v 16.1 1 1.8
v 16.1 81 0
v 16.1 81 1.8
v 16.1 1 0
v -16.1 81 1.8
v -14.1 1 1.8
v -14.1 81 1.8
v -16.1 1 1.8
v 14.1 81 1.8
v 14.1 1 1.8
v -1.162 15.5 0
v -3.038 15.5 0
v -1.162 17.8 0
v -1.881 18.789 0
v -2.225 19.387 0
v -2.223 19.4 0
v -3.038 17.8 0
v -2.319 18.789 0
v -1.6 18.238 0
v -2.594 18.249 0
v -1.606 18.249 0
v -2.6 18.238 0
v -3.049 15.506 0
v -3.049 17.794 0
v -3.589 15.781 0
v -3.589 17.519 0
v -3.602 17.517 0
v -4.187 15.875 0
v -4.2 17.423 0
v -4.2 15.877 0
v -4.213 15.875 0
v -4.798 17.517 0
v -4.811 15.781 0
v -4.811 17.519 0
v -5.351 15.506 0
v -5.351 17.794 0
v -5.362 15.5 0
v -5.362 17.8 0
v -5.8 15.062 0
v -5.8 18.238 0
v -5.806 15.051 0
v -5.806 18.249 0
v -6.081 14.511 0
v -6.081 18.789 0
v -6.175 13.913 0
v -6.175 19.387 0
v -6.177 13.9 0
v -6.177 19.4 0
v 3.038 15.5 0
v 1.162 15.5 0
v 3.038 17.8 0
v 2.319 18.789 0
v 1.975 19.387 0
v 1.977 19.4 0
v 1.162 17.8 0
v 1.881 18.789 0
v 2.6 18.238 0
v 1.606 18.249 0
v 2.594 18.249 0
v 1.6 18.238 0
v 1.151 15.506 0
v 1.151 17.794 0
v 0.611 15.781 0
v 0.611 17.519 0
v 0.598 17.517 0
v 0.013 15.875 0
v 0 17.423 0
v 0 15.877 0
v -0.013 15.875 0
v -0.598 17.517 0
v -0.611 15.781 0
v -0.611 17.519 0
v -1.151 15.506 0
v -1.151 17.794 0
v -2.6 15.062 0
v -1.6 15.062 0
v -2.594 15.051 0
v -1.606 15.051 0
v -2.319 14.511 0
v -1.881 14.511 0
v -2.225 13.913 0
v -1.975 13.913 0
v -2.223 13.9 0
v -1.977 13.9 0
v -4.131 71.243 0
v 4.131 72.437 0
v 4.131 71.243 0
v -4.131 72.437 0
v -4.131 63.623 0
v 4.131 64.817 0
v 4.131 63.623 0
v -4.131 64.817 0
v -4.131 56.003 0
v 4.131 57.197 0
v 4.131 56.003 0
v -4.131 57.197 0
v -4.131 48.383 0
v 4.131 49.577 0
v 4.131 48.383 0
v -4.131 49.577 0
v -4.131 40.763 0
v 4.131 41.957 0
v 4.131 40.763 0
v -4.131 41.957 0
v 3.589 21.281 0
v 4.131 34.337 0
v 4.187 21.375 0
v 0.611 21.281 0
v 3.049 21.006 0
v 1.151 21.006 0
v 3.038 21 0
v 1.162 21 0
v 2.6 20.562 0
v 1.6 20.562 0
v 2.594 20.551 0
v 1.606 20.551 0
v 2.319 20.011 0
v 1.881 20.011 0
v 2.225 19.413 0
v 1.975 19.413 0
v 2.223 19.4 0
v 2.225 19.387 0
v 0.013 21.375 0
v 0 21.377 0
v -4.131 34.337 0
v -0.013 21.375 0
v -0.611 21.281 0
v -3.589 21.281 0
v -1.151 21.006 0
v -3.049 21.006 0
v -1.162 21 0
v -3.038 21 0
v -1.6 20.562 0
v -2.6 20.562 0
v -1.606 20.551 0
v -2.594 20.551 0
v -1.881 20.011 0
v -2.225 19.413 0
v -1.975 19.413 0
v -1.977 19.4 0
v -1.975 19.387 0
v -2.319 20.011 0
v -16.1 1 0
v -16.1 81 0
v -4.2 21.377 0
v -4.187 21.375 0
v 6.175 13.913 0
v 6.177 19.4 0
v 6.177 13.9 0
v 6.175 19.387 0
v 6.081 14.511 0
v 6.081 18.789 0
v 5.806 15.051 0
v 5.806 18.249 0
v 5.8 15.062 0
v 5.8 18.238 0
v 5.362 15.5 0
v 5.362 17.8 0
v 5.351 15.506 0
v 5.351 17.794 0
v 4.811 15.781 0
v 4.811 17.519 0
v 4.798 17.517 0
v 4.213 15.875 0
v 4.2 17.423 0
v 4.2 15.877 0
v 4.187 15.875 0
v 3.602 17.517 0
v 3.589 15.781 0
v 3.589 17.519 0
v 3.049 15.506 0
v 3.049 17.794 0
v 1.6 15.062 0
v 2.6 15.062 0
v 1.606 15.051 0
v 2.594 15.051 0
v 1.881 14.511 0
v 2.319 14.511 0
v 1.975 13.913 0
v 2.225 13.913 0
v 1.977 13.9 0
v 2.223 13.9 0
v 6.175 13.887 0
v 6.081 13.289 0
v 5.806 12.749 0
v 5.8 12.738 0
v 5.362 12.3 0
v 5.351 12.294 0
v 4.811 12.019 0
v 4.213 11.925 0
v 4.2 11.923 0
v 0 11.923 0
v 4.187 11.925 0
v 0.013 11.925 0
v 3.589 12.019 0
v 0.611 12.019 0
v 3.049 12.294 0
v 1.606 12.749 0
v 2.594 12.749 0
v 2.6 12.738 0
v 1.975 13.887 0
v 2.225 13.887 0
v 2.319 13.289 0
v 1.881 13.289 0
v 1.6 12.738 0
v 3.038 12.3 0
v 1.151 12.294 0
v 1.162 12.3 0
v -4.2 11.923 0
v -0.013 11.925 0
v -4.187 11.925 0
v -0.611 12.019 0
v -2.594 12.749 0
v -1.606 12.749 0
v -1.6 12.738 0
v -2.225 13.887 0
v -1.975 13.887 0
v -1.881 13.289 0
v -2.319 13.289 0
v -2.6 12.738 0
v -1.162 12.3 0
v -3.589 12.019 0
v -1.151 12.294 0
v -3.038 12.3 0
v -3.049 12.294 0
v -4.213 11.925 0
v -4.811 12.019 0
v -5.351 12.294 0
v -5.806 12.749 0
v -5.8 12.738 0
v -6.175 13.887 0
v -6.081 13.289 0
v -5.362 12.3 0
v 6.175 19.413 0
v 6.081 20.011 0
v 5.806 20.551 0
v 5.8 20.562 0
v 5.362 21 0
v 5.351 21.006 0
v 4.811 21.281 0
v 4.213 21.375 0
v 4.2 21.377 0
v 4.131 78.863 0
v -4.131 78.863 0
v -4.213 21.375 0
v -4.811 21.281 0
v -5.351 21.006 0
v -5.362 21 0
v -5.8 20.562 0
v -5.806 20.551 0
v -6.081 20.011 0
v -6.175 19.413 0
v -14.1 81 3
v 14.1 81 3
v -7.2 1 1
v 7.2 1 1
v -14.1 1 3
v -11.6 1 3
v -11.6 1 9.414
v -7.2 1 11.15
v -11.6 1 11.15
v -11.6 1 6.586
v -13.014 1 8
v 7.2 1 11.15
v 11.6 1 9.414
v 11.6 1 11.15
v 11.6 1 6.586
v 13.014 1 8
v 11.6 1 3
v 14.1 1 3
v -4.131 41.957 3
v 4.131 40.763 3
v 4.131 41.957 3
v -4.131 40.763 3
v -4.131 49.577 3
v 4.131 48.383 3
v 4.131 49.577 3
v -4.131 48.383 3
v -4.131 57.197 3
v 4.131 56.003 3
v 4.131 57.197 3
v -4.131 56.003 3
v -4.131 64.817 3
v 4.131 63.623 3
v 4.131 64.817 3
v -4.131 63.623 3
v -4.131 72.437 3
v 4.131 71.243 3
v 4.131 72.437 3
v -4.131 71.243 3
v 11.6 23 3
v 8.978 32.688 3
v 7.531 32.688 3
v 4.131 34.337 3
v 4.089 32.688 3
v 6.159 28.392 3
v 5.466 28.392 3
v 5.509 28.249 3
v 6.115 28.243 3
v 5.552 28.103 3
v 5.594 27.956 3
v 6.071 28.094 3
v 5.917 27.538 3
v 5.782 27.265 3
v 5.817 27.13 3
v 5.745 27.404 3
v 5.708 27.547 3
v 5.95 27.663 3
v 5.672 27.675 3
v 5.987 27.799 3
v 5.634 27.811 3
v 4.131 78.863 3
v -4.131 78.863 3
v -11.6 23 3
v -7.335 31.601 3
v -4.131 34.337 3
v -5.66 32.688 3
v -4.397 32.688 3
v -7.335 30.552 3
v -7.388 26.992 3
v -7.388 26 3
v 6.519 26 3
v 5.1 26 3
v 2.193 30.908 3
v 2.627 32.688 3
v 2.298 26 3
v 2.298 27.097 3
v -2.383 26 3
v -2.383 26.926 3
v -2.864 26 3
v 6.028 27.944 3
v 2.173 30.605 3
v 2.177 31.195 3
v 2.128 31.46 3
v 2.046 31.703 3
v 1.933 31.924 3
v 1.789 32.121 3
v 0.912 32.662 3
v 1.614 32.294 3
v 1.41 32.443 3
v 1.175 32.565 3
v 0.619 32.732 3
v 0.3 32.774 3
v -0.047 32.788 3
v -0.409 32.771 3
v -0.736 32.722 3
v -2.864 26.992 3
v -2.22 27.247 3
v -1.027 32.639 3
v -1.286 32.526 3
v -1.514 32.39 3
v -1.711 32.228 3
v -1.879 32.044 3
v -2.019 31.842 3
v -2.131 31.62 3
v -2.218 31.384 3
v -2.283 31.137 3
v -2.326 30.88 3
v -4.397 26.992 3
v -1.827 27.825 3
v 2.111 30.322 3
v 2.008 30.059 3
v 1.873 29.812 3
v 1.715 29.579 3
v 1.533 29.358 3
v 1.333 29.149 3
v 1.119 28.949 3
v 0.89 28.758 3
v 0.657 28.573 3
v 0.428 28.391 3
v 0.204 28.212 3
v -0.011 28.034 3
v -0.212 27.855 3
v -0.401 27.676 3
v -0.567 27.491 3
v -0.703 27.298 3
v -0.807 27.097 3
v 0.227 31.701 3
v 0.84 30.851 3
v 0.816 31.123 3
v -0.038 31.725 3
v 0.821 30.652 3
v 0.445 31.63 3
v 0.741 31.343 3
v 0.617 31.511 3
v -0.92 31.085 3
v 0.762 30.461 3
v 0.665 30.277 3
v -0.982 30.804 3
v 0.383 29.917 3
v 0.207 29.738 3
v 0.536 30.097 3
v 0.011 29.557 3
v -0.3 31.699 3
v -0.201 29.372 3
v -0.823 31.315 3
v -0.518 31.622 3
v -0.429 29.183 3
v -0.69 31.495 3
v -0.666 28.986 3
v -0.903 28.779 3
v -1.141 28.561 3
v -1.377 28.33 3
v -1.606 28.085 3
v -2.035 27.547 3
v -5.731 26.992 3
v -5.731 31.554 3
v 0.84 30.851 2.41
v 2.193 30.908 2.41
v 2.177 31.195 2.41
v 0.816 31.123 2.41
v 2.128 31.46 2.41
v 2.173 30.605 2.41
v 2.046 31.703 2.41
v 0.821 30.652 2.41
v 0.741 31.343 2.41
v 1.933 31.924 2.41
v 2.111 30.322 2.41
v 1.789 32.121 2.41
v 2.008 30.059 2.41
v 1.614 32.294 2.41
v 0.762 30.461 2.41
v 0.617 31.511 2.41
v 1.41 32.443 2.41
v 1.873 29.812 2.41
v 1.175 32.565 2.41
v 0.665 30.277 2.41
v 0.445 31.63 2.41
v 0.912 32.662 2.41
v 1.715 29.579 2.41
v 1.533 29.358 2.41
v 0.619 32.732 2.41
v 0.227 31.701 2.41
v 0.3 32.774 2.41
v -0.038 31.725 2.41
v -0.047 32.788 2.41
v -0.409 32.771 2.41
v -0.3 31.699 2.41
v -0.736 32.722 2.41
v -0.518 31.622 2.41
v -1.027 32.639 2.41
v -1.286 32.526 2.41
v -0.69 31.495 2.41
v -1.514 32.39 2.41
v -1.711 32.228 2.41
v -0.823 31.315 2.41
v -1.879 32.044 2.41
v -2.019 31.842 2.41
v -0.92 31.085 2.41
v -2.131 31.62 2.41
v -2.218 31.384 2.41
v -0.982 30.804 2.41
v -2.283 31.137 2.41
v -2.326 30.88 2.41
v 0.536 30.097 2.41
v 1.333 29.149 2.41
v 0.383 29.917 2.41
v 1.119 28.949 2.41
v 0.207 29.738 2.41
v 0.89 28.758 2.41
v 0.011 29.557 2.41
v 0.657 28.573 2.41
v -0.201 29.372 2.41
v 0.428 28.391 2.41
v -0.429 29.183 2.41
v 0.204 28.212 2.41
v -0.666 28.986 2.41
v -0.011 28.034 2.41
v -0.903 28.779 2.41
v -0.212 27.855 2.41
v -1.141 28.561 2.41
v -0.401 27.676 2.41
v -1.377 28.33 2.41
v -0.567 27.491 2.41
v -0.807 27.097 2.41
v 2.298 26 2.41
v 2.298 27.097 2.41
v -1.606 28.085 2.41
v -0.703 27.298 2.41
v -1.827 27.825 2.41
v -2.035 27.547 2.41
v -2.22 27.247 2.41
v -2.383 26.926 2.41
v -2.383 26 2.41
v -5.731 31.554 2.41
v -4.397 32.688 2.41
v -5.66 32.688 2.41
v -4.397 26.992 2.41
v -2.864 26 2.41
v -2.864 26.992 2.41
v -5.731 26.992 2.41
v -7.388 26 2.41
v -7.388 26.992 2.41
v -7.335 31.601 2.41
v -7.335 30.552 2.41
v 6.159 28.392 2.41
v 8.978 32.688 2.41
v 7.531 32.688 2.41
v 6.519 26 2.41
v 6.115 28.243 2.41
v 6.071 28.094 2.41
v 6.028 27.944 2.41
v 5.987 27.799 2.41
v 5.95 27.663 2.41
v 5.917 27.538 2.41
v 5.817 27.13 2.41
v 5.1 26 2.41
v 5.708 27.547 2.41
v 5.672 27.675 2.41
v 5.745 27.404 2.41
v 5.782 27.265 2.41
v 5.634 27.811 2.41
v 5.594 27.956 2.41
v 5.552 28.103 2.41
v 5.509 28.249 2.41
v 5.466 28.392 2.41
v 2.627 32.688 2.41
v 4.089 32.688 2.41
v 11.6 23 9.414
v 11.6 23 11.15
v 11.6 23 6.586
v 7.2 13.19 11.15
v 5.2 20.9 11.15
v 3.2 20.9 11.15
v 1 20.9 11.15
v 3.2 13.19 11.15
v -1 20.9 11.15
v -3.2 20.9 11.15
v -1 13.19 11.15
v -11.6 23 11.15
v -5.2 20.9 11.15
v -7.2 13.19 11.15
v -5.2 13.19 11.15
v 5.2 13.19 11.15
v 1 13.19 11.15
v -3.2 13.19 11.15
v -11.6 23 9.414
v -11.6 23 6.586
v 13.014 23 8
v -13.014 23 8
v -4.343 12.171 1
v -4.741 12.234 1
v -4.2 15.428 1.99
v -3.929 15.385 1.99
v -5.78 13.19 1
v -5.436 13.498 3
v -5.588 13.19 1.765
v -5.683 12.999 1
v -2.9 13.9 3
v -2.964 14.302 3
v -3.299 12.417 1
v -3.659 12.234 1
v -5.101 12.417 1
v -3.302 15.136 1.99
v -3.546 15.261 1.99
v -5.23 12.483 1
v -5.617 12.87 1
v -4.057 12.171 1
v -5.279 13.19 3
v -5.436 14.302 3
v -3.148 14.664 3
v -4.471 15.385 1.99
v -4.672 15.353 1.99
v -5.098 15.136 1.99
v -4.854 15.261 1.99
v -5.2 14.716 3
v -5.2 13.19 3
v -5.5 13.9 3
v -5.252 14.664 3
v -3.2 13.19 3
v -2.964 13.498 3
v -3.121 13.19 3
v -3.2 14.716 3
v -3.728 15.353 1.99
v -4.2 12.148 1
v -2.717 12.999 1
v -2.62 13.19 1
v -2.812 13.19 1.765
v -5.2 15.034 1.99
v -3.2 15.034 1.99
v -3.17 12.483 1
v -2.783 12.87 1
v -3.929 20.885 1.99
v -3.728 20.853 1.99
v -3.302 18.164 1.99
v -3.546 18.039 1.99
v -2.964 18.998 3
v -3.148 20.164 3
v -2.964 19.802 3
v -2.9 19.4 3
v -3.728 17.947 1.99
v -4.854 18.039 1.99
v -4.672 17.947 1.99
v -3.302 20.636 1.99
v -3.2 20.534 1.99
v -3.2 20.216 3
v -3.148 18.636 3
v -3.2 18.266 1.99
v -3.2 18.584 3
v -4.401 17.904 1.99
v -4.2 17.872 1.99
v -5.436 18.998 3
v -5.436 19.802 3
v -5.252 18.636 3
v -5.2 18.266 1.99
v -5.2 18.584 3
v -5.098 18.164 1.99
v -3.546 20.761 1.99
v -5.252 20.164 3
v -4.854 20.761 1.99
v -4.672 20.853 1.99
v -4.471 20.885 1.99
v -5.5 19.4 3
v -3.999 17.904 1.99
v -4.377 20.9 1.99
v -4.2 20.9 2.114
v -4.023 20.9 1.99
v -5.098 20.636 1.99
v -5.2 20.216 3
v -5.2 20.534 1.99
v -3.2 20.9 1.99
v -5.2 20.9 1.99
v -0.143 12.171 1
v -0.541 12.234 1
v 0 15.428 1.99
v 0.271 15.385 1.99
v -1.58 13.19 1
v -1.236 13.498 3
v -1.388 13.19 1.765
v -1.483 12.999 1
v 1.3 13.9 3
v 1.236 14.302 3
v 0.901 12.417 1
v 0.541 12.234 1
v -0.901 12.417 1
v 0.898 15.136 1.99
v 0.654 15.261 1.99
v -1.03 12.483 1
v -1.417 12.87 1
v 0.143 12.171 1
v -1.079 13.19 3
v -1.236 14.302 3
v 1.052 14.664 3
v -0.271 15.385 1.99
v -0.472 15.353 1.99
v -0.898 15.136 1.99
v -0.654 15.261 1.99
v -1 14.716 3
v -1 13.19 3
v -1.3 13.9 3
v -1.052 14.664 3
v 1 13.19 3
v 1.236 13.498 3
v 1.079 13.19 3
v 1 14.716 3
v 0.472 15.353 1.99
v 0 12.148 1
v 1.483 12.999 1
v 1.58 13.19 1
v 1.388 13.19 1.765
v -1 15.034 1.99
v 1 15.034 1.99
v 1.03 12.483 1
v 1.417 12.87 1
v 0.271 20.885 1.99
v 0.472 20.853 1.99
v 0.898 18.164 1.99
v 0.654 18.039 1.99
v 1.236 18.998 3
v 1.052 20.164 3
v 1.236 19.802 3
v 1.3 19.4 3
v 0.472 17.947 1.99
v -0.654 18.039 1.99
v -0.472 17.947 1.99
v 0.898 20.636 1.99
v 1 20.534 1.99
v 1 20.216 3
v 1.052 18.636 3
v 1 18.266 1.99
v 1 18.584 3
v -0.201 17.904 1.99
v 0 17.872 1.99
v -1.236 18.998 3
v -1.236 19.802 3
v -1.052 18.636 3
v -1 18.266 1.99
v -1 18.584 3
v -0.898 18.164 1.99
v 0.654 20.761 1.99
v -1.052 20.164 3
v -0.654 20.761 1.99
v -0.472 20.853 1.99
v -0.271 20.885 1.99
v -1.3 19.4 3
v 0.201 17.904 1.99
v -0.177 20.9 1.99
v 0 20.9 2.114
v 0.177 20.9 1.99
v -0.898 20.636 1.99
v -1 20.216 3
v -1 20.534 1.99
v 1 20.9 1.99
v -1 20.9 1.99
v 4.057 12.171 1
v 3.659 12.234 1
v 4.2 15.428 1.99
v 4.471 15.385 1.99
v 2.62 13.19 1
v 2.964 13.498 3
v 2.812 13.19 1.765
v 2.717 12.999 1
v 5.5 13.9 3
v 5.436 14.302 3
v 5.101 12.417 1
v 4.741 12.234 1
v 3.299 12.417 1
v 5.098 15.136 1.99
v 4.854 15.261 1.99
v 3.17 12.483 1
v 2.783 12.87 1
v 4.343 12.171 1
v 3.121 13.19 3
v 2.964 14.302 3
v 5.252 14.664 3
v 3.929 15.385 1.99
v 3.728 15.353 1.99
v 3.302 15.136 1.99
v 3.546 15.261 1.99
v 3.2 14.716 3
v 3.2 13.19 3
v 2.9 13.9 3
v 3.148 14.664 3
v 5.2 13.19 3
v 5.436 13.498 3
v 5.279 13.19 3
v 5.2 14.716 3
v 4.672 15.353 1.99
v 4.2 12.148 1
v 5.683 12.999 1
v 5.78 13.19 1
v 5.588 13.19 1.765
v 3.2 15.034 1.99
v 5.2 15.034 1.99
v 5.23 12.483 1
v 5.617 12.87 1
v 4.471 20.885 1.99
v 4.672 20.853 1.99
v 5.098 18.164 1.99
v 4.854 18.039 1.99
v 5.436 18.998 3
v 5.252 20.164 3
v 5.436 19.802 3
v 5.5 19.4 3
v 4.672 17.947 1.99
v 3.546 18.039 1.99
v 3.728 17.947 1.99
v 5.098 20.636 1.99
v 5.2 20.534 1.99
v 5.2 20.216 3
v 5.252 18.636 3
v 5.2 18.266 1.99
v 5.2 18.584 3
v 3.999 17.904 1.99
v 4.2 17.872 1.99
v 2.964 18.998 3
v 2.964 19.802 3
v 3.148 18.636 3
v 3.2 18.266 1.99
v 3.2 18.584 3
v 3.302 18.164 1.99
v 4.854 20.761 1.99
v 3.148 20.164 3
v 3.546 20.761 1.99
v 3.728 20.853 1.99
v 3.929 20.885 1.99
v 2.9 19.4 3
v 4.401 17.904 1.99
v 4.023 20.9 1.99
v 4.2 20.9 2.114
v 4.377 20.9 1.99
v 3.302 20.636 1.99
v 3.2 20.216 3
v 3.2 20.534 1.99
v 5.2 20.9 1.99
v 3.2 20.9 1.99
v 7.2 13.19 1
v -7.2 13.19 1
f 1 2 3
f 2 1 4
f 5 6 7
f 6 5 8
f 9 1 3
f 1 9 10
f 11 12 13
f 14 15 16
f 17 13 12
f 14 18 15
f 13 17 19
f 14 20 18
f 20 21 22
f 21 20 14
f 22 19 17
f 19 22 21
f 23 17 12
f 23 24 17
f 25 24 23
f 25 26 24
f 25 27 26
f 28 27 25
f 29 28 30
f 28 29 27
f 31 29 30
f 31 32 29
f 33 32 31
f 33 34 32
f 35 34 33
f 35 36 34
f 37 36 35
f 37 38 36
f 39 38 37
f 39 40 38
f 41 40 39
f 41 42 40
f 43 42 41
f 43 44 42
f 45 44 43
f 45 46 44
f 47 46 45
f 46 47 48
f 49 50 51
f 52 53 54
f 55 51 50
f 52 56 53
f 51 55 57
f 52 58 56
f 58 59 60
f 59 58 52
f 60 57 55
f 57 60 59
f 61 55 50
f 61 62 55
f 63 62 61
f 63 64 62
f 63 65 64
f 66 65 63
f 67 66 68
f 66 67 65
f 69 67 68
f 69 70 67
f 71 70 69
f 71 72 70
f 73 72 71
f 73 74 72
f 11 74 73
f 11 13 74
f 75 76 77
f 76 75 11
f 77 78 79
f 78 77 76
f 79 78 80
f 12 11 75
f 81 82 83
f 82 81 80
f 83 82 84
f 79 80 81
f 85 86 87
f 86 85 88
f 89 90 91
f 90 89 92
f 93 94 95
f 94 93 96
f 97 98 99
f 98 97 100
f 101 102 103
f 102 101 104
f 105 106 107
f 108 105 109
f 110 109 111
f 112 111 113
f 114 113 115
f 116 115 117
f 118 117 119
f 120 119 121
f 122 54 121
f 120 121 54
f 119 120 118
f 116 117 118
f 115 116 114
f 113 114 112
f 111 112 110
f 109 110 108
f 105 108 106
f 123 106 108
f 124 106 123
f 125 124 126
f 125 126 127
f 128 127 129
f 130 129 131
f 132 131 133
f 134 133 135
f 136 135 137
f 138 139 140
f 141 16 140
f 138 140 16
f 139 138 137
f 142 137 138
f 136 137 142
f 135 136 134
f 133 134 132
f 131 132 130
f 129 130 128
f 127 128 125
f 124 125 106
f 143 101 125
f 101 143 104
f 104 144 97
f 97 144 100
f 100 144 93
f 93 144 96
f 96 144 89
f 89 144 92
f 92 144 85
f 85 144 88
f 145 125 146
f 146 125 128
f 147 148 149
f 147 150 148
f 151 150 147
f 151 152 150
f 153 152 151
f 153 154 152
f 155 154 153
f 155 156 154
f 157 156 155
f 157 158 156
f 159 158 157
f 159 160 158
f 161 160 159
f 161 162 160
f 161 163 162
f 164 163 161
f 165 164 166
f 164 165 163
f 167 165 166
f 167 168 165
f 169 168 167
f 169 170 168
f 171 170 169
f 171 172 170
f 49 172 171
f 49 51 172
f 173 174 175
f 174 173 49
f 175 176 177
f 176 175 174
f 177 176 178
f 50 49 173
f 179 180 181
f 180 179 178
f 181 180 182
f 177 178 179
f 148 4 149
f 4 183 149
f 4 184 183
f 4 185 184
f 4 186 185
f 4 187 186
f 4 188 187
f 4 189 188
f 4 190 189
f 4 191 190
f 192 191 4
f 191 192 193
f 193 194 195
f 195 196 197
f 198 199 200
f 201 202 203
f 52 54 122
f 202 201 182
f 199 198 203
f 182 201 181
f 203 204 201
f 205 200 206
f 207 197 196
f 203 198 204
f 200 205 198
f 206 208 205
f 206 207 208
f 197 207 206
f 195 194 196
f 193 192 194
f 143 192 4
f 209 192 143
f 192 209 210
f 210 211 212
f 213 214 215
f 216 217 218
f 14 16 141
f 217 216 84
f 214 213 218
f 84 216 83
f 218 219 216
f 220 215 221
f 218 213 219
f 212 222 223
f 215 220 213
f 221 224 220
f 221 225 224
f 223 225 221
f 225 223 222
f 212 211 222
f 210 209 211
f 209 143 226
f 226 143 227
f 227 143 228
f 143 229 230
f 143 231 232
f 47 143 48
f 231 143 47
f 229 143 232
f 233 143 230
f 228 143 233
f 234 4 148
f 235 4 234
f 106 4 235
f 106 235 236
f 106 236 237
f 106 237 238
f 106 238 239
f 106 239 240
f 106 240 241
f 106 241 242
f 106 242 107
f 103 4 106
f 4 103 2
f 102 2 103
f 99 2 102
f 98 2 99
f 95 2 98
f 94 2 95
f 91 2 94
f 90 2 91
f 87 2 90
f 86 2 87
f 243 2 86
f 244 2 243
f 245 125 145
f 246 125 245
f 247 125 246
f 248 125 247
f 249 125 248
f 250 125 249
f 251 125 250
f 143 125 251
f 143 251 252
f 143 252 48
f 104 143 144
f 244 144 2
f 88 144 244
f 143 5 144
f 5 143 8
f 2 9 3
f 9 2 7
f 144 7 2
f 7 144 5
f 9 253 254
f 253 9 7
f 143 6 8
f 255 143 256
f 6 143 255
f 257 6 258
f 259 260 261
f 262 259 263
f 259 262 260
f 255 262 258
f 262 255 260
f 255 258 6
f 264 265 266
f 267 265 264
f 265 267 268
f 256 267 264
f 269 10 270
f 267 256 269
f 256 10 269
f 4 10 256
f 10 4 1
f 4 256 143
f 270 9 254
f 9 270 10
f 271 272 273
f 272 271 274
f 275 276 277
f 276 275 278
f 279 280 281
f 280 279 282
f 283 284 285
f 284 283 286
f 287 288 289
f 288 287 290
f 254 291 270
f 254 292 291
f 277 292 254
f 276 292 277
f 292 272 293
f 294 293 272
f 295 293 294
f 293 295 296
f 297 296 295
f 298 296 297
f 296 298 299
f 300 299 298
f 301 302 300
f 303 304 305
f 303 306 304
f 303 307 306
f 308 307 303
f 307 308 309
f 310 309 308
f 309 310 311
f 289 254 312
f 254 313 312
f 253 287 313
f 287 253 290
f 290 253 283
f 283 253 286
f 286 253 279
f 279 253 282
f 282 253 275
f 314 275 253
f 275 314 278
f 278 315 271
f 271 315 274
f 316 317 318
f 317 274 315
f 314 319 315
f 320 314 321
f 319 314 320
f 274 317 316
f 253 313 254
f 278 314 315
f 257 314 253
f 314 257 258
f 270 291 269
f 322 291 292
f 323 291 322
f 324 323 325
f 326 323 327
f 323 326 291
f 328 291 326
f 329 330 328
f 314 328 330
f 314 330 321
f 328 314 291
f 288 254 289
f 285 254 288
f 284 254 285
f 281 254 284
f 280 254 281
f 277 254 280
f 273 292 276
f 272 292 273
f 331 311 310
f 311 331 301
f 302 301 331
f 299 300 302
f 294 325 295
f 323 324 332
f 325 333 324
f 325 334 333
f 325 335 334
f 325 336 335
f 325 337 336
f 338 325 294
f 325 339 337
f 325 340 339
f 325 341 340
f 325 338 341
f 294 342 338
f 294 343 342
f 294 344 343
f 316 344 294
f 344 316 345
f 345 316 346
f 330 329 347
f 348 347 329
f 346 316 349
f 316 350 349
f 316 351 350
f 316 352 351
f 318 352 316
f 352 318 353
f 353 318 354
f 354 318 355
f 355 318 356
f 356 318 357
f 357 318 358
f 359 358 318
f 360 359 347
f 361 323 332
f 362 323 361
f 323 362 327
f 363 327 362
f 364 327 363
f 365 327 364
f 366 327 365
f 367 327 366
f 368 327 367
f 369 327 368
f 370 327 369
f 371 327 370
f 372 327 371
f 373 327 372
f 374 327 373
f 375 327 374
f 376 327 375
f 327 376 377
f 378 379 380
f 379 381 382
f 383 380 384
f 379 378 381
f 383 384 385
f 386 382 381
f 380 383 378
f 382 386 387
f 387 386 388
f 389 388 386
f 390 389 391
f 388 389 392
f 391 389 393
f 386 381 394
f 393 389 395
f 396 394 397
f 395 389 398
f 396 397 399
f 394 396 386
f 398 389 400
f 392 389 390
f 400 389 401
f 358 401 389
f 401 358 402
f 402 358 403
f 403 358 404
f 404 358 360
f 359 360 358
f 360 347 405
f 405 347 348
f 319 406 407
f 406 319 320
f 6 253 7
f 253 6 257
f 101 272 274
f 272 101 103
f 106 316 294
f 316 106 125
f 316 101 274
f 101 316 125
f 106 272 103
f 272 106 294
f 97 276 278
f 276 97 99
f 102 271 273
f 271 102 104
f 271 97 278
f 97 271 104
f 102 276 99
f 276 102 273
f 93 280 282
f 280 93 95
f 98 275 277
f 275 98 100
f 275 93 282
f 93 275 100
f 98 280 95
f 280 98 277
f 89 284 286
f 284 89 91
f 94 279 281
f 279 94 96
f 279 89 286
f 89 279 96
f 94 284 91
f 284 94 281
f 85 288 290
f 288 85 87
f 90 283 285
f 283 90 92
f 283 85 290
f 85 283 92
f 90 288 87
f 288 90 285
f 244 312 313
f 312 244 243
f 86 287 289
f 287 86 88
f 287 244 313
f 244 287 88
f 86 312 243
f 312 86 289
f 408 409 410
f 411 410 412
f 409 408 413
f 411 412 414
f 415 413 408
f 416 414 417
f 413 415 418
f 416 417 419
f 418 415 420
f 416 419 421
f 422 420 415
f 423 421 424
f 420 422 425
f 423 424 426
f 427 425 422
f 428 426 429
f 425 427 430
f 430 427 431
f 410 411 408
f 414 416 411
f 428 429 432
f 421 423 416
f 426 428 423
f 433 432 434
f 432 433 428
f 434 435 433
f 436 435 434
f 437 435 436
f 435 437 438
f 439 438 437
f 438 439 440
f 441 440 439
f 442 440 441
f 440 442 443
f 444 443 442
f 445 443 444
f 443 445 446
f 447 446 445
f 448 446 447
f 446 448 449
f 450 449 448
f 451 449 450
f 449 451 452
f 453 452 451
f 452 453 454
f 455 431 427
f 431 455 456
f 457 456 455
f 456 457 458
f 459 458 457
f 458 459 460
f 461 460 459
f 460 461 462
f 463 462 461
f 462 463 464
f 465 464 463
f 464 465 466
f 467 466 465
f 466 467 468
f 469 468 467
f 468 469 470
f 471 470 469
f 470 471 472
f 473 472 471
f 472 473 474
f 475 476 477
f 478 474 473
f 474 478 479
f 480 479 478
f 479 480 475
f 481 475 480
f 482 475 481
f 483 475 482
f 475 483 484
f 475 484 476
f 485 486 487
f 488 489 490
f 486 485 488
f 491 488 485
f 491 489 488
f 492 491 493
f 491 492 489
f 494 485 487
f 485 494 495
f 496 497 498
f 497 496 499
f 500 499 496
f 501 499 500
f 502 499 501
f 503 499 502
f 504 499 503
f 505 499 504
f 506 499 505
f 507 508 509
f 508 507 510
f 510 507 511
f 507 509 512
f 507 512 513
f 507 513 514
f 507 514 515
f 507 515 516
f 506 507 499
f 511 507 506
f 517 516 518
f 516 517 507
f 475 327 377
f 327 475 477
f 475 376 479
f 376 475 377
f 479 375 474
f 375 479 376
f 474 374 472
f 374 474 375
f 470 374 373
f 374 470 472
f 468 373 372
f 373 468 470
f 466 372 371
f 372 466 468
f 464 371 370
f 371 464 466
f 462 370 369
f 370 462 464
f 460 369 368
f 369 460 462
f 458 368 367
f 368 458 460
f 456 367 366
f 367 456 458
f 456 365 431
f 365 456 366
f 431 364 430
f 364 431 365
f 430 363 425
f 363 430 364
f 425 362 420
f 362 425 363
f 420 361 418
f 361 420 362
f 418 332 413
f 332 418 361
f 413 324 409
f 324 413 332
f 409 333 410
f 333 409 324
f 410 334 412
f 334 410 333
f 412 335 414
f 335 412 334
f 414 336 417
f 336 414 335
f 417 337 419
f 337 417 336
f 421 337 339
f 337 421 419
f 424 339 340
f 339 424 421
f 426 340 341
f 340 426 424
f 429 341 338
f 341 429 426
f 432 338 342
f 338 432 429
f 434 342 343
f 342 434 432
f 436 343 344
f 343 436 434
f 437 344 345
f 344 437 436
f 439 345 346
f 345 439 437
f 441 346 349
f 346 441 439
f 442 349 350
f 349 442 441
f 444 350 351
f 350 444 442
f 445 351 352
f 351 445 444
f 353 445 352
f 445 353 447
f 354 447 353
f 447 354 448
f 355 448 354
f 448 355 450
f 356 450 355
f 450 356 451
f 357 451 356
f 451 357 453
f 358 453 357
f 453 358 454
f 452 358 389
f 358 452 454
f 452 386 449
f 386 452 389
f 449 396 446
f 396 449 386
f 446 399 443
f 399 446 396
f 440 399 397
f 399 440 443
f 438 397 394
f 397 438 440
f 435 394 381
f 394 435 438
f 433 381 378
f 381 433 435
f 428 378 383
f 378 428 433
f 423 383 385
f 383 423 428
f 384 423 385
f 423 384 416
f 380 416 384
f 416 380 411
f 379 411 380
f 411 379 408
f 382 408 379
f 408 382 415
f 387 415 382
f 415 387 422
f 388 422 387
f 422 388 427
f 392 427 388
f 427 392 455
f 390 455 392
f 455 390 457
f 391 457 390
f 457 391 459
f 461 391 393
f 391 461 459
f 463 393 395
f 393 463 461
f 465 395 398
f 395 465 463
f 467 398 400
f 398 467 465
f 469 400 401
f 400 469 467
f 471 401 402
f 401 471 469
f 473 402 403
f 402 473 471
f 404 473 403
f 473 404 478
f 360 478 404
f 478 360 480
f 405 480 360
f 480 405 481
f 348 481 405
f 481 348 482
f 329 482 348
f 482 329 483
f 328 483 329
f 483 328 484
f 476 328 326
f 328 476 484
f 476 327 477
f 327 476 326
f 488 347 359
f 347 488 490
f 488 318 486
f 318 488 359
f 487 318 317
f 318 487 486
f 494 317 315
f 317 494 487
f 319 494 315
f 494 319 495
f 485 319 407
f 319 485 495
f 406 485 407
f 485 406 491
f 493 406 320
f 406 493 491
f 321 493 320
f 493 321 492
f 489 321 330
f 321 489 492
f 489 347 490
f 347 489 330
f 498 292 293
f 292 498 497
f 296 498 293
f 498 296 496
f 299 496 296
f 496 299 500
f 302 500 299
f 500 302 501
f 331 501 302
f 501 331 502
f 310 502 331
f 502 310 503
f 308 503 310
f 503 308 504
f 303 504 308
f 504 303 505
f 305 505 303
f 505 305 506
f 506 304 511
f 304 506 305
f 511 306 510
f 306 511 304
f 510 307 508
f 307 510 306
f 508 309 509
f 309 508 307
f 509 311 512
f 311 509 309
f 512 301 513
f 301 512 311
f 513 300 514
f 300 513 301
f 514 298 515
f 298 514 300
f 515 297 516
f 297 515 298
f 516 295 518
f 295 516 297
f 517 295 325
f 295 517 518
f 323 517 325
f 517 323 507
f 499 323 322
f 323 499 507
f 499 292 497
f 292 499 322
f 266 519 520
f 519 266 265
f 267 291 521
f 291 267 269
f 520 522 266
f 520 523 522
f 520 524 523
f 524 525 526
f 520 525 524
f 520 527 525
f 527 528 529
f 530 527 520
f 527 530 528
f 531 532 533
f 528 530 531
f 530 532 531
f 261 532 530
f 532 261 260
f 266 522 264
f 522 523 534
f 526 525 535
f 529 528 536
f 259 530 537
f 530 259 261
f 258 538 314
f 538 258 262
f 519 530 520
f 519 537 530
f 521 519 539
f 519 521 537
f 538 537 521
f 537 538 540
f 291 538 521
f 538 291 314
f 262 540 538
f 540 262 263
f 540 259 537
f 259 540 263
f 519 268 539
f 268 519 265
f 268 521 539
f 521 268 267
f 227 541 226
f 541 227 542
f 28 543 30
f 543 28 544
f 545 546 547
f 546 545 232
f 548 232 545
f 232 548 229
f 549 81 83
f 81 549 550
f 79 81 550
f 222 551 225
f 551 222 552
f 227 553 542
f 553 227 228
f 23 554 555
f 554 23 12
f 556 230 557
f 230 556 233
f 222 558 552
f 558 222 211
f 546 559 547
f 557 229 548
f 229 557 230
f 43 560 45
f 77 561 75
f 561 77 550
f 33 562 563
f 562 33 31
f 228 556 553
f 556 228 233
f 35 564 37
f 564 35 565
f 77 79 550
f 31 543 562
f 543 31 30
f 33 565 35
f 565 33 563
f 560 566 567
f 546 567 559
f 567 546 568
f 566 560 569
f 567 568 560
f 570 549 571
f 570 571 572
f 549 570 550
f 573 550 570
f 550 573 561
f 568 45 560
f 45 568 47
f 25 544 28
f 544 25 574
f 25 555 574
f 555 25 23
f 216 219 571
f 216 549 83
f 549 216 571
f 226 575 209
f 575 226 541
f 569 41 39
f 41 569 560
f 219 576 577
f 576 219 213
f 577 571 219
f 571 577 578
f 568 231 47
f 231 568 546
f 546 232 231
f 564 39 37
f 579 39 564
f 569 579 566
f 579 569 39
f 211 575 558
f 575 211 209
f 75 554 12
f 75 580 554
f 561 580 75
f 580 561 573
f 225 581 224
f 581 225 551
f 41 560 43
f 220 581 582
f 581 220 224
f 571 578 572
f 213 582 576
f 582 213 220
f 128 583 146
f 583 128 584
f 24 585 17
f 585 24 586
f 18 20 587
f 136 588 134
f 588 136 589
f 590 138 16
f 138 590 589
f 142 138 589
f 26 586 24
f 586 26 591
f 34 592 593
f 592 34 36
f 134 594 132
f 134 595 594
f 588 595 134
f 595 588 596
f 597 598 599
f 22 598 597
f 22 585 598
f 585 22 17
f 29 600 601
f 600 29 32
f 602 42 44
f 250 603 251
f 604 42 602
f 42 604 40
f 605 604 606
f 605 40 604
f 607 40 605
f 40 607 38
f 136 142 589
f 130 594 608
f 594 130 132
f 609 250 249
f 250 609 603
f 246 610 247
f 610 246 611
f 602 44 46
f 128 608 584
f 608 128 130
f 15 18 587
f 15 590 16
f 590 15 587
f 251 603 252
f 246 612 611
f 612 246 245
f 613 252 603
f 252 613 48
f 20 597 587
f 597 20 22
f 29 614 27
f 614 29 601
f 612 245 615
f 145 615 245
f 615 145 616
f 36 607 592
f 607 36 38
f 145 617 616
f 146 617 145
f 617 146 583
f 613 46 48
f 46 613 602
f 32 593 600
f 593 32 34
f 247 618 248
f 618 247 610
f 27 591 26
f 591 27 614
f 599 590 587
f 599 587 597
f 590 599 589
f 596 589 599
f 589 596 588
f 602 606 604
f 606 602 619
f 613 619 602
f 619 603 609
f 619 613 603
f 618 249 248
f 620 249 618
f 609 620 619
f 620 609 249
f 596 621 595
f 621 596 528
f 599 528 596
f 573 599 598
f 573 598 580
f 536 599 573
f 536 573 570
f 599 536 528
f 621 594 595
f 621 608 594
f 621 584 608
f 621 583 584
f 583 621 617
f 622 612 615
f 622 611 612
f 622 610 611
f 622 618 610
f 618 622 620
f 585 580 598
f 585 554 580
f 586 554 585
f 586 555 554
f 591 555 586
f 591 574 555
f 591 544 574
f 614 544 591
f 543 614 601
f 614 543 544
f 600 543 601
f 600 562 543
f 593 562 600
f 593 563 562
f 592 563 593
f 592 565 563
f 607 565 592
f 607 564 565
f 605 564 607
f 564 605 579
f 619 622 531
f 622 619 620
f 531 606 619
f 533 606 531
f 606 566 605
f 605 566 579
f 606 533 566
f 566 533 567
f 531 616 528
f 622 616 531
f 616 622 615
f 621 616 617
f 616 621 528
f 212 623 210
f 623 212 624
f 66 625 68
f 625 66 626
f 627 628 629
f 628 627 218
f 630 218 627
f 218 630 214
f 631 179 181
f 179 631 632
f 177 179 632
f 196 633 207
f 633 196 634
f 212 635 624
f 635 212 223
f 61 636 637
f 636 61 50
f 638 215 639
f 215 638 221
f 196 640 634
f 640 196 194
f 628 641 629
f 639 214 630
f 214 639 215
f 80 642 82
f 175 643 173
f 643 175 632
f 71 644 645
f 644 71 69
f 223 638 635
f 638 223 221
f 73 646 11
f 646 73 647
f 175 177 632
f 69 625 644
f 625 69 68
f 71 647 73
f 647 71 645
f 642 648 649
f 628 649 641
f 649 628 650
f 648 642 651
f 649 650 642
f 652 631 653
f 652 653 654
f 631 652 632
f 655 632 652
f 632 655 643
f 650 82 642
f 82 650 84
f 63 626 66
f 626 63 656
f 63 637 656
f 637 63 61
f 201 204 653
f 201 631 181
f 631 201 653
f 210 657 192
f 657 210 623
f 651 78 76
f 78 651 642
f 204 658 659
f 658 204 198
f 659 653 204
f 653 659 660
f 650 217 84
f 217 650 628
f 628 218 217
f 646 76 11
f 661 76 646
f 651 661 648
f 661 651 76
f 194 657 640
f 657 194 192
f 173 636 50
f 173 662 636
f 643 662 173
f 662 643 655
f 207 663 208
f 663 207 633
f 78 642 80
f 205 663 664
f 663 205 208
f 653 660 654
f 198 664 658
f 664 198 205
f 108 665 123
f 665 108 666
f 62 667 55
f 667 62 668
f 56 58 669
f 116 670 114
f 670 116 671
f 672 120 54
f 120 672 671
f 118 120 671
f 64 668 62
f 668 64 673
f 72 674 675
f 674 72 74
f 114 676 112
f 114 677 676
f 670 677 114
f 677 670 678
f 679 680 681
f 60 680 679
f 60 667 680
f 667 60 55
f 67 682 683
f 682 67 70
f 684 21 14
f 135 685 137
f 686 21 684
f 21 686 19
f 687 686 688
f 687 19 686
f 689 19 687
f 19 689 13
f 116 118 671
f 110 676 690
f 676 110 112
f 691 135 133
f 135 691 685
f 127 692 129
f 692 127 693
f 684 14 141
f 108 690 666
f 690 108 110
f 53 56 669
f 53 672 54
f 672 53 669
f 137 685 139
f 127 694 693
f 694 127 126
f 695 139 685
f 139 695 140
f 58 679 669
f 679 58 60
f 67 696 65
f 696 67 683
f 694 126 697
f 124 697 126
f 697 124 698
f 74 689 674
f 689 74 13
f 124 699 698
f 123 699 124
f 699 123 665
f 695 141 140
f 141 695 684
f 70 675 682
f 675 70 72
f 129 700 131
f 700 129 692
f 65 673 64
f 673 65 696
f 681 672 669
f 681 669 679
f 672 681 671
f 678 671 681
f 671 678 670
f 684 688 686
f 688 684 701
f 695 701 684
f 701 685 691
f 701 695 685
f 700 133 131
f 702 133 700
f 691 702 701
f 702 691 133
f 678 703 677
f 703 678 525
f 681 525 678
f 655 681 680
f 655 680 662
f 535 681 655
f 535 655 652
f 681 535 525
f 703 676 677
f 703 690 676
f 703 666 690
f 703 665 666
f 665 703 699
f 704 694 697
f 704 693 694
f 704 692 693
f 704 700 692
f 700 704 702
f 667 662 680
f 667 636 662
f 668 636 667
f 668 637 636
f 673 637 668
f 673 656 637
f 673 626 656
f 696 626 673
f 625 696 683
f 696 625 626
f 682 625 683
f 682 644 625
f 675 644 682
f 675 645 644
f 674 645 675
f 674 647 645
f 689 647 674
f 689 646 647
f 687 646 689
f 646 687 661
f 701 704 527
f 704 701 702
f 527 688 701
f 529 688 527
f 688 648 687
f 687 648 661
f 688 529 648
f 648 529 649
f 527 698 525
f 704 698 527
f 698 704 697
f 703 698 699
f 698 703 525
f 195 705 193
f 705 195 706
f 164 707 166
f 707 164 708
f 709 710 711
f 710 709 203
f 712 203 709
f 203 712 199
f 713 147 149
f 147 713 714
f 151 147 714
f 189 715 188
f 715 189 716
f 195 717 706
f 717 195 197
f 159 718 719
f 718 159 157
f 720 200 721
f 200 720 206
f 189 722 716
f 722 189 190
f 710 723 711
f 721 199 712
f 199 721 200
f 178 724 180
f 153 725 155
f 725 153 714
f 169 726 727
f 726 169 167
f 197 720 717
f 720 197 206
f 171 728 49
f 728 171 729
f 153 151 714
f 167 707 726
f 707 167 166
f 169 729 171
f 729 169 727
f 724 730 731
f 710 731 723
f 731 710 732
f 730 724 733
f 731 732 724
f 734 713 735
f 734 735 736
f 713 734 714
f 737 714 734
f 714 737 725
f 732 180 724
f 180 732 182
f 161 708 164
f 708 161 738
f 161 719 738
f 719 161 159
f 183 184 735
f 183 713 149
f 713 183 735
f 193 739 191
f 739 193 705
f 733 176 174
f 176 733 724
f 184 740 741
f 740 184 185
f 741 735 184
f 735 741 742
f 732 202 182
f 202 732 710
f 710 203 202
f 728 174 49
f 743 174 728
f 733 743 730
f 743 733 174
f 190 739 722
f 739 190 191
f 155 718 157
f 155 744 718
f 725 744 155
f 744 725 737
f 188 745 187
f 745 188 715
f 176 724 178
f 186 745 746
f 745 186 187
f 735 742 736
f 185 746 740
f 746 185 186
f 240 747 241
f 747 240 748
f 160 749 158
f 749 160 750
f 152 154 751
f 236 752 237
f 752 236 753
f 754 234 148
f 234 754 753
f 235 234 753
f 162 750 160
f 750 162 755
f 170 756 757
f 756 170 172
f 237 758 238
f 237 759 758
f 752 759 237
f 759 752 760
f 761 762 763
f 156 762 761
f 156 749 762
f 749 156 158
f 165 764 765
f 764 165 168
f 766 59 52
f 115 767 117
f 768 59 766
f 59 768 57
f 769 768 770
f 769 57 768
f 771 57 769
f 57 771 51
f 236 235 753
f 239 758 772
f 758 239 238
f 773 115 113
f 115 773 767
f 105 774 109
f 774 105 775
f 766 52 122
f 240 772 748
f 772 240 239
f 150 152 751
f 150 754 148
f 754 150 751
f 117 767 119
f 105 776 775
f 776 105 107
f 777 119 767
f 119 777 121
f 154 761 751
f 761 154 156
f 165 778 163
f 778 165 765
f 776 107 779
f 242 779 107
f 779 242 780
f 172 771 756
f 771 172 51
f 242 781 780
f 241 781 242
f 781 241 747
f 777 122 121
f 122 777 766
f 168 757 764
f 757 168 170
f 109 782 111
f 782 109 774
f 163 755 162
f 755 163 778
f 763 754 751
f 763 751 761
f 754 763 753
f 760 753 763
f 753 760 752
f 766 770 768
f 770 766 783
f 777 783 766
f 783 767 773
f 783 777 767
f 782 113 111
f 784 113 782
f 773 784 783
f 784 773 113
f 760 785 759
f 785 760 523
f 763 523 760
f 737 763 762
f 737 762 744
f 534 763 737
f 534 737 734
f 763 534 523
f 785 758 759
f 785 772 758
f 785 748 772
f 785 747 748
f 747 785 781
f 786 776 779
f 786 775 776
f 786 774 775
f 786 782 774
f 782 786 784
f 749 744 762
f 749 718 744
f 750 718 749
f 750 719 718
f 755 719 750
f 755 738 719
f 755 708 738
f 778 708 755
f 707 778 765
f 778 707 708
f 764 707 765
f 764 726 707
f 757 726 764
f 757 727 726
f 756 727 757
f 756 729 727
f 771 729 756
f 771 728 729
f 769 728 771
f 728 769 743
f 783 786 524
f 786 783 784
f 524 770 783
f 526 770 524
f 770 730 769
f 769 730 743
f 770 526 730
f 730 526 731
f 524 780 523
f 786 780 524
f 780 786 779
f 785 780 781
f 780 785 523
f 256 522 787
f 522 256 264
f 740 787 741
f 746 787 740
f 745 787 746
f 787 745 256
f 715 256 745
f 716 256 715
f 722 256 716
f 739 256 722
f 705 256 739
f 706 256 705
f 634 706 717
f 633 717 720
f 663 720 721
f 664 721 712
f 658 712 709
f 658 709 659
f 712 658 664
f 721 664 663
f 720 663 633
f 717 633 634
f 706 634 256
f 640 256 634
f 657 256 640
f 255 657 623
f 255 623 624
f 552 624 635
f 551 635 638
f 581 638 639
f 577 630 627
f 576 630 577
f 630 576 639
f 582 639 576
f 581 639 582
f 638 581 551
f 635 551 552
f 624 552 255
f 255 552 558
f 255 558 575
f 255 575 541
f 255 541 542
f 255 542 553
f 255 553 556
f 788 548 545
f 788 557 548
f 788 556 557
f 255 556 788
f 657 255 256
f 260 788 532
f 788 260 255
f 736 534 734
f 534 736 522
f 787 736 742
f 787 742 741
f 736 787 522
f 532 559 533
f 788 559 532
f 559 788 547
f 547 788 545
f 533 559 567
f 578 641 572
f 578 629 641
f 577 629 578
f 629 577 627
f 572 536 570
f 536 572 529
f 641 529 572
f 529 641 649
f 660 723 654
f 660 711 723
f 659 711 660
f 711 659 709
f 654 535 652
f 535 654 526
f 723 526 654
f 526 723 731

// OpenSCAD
// file: ../PCParts/common.scad
atx_psu_width = 150;
atx_psu_height = 86;

card_spacing = 20.32;

fan_connector_width = 6.1;
fan_connector_length = 7.9;

fan_92mm = 92;
fan_92mm_bolt_offset = 82.5/2;

module mock_mobo() {
    $fn=50;
    difference() {
        cube([304.8, 243.84, 2]);
        translate([6.35+281.94,10.16,0]) cylinder(d=4, h=3);
        translate([6.35+281.94,10.16+154.94,0]) cylinder(d=4, h=3);
        translate([6.35+281.94,10.16+227.33,0]) cylinder(d=4, h=3);

        translate([6.35+157.48+45.72,10,0]) cylinder(d=4, h=3);

        translate([6.35+157.48,10.16,0]) cylinder(d=4, h=3);
        translate([6.35+157.48,10.16+154.94,0]) cylinder(d=4, h=3);
        translate([6.35+157.48,10.16+227.33,0]) cylinder(d=4, h=3);

        translate([6.35,22.86,0]) cylinder(d=4, h=3);
        translate([6.35,10.16+154.94,0]) cylinder(d=4, h=3);
        translate([6.35,10.16+227.33,0]) cylinder(d=4, h=3);
    }
}

module mock_card() {
    $fn=50;
    cube([200, 2, 106.7]);
    translate([-12.3, -15.8+22-19.4, -18.8+119.2]) difference() {
        cube([12.3,19.4,1]);
        translate([6.3, 19.4-1-4.8/2,0]) hull() {
            cylinder(d=4.8,h=2, $fn=40);
            translate([0,5,0]) cylinder(d=4.8,h=2, $fn=40);
        }
    }
    difference() {
        translate([-1,-15.8, -18.8]) cube([1,22, 120.2]);
        translate([-1.3,-15.8, -18.8]) cube([2,(18.8-10.6)/2, 11.2]);
        translate([-1.3,-15.8+10.6+(18.8-10.6)/2, -18.8]) cube([2,(18.8-10.6)/2, 11.2]);
        translate([-1.3,-15.8+18.8, -18.8]) cube([2,5, 116.2]);
        translate([-1.3,-15.8, -18.8+116.2]) cube([2,22-18.8, 5]);
    }
    
}

module mock_mobo_card() {
    
    mock_mobo();
    translate([304.8-142,-1.2,18.8-10.4]) rotate([0,0,90]) mock_card();
    translate([304.8-142+card_spacing,-1.2,18.8-10.4]) rotate([0,0,90]) mock_card();
    translate([304.8-142+2*card_spacing,-1.2,18.8-10.4]) rotate([0,0,90]) mock_card();
    translate([304.8-142+3*card_spacing,-1.2,18.8-10.4]) rotate([0,0,90]) mock_card();
    translate([304.8-142+4*card_spacing,-1.2,18.8-10.4]) rotate([0,0,90]) mock_card();
    translate([304.8-142+5*card_spacing,-1.2,18.8-10.4]) rotate([0,0,90]) mock_card();
    translate([304.8-142+6*card_spacing,-1.2,18.8-10.4]) rotate([0,0,90]) mock_card();
}

module mock_ssd() {
    difference() {
        cube([70, 100, 7.1]);
        translate([9.4,0,6.5]) cube([41.4,7,1]);
        translate([10.4,0,0]) cube([39.4,7,2]);
    }
    translate([0,13.6,3]) rotate([0,-90,0]) cylinder(d=2.5, h=5, $fn=30);
    translate([0,100-9.2,3]) rotate([0,-90,0]) cylinder(d=2.5, h=5, $fn=30);

    translate([70+5,13.6,3]) rotate([0,-90,0]) cylinder(d=2.5, h=5, $fn=30);
    translate([70+5,100-9.2,3]) rotate([0,-90,0]) cylinder(d=2.5, h=5, $fn=30);

}


hd_width = 102;
hd_height = 26.1;

screw_dia = 3.6;

module mock_hd() {
    color("white") difference() {
        cube([hd_width,146,26]);
        translate([0,28.3,6.40]) rotate([0,90,0]) cylinder(d=screw_dia, h=5, $fn=30);
        translate([0,69.8,6.40]) rotate([0,90,0]) cylinder(d=screw_dia, h=5, $fn=30);
        translate([0,129.8,6.40]) rotate([0,90,0]) cylinder(d=screw_dia, h=5, $fn=30);

        translate([hd_width-5,28.3,6.40]) rotate([0,90,0]) cylinder(d=screw_dia, h=5, $fn=30);
        translate([hd_width-5,69.8,6.40]) rotate([0,90,0]) cylinder(d=screw_dia, h=5, $fn=30);
        translate([hd_width-5,129.8,6.40]) rotate([0,90,0]) cylinder(d=screw_dia, h=5, $fn=30);

    }
        
}

module minus_atx_psu_holes(hole=3.2) {
    difference() {
        children();
        translate([-138/2,0,6]) rotate([-90,0,0]) cylinder(d=hole, h=5, $fn=30);
        translate([138/2,0,6]) rotate([-90,0,0]) cylinder(d=hole, h=5, $fn=30);
        translate([138/2,0,6+64]) rotate([-90,0,0]) cylinder(d=hole, h=5, $fn=30);
        translate([-150/2+30,0,atx_psu_height-6]) rotate([-90,0,0]) cylinder(d=hole, h=5, $fn=30);
    }
}

module mock_atx_psu(holes=true, slop=0) {
    w = atx_psu_width+2*slop;
    h = atx_psu_height+2*slop;
    if (holes) {
        minus_atx_psu_holes() {
            translate([-w/2,0,0]) cube([w, 140, h]);
        }
    } else {
        translate([-w/2,0,0]) cube([w, 140, h]);
    }
}


module mock_fan_connector_male(slop=0.2) {
    
    module pin() {
        color("grey") cube([0.75,0.75,14.3],center=true);
    }
    
    w = fan_connector_width + slop;
    l = fan_connector_length + slop;
    
    pin_offset = (5.8-0.75)/2;
    union() {
        color("white") {
            translate([0,0,3.2/2]) cube([w, l,3.2], center=true);
            translate([-w/2+0.9/2,0,3.2+8.5/2]) cube([0.9,5,8.5],center=true);
            translate([-w/2+0.9+0.3/2,0,1.7/2+5.7]) cube([0.3,5,1.7],center=true);
        }
        
        translate([-w/2+2.4,0,14.3/2-3.6]) pin();
        translate([-w/2+2.4,pin_offset,14.3/2-3.6]) pin();
        translate([-w/2+2.4,-pin_offset,14.3/2-3.6]) pin();
    }
}


//mock_mobo();
//mock_card();
//mock_mobo_card();
//mock_ssd();
//mock_atx_psu();
//mock_fan_connector_male();
// main file
include <../PCParts/common.scad>;


////// VARIABLES //////
atx_connector_w = 52.2;
atx_connector_l = 10.1;
atx_connector_h = 13;
atx_connector_pins = 24;
atx_connector_pins_w = 47.6;

pcie_connector_w = 14.2;
pcie_connector_l = 10;
pcie_connector_h = 13;
pcie_connector_pins = 6;
pcie_connector_pins_w = 9.5;

pin_d = 1.1;

mount_w = atx_connector_w + pcie_connector_w + 5 + 4;
mount_l = atx_connector_h + 9;

mount_s_w = pcie_connector_w + 5 + 4;
mount_s_l = mount_l;

echo("Mount W", mount_w);
echo("Mount S W", mount_s_w);

echo(mount_w);

y_offset = 2.2;


////// VIEW //////
//debug();
//debug_small();

//mock_atx_connector();
//mock_pcie_connector();
//mock_connector_pcb();

//mount();
//mount_top();

mount_small();
//mount_top_small();


////// MODULES //////
function pin_spacing(w, pin_d, pins) = (w - pin_d)/(pins/2 - 1);
function x_offset(w, pins_w) = -pins_w/2;


module _mock_connector(w, l, h, pins, pins_w) {
    module bent_pin(pin_l) {
        translate([0, 0, 6.7/2])
        cube([pin_d, pin_d, 6.7], center=true);

        translate([0, (pin_l - pin_d)/2, 6.7 - pin_d/2 ])
        cube([pin_d, pin_l, pin_d], center=true);
    }

    translate([0, 0, h/2])
    cube([w, l, h], center=true);
    
    spacing = pin_spacing(pins_w, pin_d, pins);
    echo(spacing);
    x_offset = x_offset(w, pins_w);

    for (i = [0:(pins/2) - 1]) {
        translate([
            x_offset + i*spacing + pin_d/2,
            -l/2 + y_offset + pin_d/2, h
        ])
        bent_pin(11.3);
    }
    
    y_offset_2 = l/2 - y_offset - pin_d/2;
    for (i = [0:(pins/2) - 1]) {
        translate([
            x_offset + i*spacing + pin_d/2,
            y_offset_2, h - (6.4 - pin_d)
        ])
        bent_pin(7);
    }
}

module mock_atx_connector() {
    
    _mock_connector(
        atx_connector_w, atx_connector_l,
        atx_connector_h, atx_connector_pins,
        atx_connector_pins_w
    );
}

module mock_pcie_connector() {
    
    _mock_connector(
        pcie_connector_w, pcie_connector_l,
        pcie_connector_h, pcie_connector_pins,
        pcie_connector_pins_w
    );
}

module mock_connector_pcb() {
    w = mount_w - 5;
    echo(w);
    
    row1_x = -w/2 + 43.6 + fan_connector_width/2;
    row1_y = -35/2 + 21.1 + fan_connector_length/2;

    row2_x = -w/2 + 28.4 + fan_connector_width/2;
    row2_y = -35/2 + 6 + fan_connector_length/2;

    spacing = (36.4 - fan_connector_width)/4;

    union() {
        translate([0, 0, 1.8/2])
        cube([w, 35, 1.8], center=true);

        translate([
            -w/2 + 11.75 + fan_connector_length/2,
            -35/2 + 17.3 + fan_connector_width/2, 1.78
        ])
        rotate([0, 0, 90])
        mock_fan_connector_male();

        translate([row1_x, row1_y, 1.78])
        mock_fan_connector_male();

        translate([row1_x + spacing, row1_y, 1.78])
        mock_fan_connector_male();

        translate([row1_x + 2*spacing, row1_y, 1.78])
        mock_fan_connector_male();

        translate([row2_x, row2_y, 1.78])
        mock_fan_connector_male();

        translate([row2_x + spacing, row2_y, 1.78])
        mock_fan_connector_male();

        translate([row2_x + 2*spacing, row2_y, 1.78])
        mock_fan_connector_male();

        translate([row2_x + 3*spacing, row2_y, 1.78])
        mock_fan_connector_male();

        translate([row2_x + 4*spacing, row2_y, 1.78])
        mock_fan_connector_male();
    }
}

module mock_connector_pcb_small() {
    w = mount_s_w;

    spacing = 2.54 * 3;

    union() {
        translate([0, 0, 1.8/2])
        cube([w, 25.4 * 2, 1.8], center=true);

        for(i = [0:5]) {
            translate([
                0, -22 + fan_connector_width/2 + i * spacing,
                1.78
            ])
            rotate([0, 0, 90])
            scale([1.02, 1.02, 1])
            mock_fan_connector_male();
        }
    }
}

module debug() {
    mount();

    translate([0, 50, -1.8])
    //rotate([180, 0, 0])
    mock_connector_pcb();
}

module debug_small() {
    mount_small();

    translate([0, 56.5, -1.8])
    //rotate([180, 0, 0])
    mock_connector_pcb_small();
}

module _side_notch(l) {
    rotate([0, 45, 0])
    cube([2, l, 2], center=true);
}

module _pin_hole() {
    $fn = 20;
    d1 = 4;
    d2 = 2.6;

    translate([0, 0, -0.1])
    cylinder(d1=d1, d2=d2, h=3.1);

    translate([0, 5.5, -0.1])
    cylinder(d1=d1, d2=d2, h=3.1);

    translate([0, 9/2 - 2, 20/2 + 1.99])
    cube([2, 9, 20], center=true);
}

module mount() {

    spacing_a = pin_spacing(
        atx_connector_pins_w, pin_d, atx_connector_pins
    );

    spacing_p = pin_spacing(
        pcie_connector_pins_w, pin_d, pcie_connector_pins
    );

    atx_x_pos = -mount_w/2 + (atx_connector_w + 0.2)/2 + 2.2;
    pcie_x_pos = mount_w/2 - (pcie_connector_w + 0.2)/2 - 2.2;

    atx_pins_x_pos = 
        atx_x_pos - atx_connector_pins_w/2 + pin_d/2;

    pcie_pins_x_pos = 
        pcie_x_pos - pcie_connector_pins_w/2 + pin_d/2;

        
    difference() {
        union() {
            translate([
                0, mount_l/2 + 1, (atx_connector_l + 1.1)/2
            ])
            cube([
                mount_w, mount_l, atx_connector_l + 1.1
            ], center=true);

            translate([
                -mount_w/2, mount_l/2 + 1, atx_connector_l - 2
            ])
            _side_notch(mount_l);

            translate([
                mount_w/2, mount_l/2 + 1, atx_connector_l - 2
            ])
            _side_notch(mount_l);

            translate([-mount_w/2 - 2, 1, 0])
            cube([3, mount_l, 1.8]);

            translate([mount_w/2 - 1, 1, 0])
            cube([3, mount_l, 1.8]);

            translate([0, 50, 0])
            _connector_pcb_mount();
        }

        translate([
            atx_x_pos,
            (atx_connector_h + 0.2)/2 - 0.01,
            (atx_connector_l + 2)/2 + 1
        ])
        cube([
            atx_connector_w + 0.2,
            atx_connector_h + 0.2,
            atx_connector_l + 2
        ], center=true);

        translate([
            pcie_x_pos,
            (pcie_connector_h + 0.2)/2 - 0.01,
            (pcie_connector_l + 2)/2 + 1
        ])
        cube([
            pcie_connector_w + 0.2,
            pcie_connector_h + 0.2, pcie_connector_l + 2
        ], center=true);
        
        for (i = [0:(atx_connector_pins/2) - 1]) {
            translate([
                atx_pins_x_pos + i*spacing_a,
                atx_connector_h + 0.9, 0
            ])
            _pin_hole();
        }
        
        for (i = [0:(pcie_connector_pins/2) - 1]) {
            translate([
                pcie_pins_x_pos + i*spacing_p,
                pcie_connector_h + 0.9, 0
            ])
            _pin_hole();
        }
    }

    %translate([atx_x_pos, 0, 1 + atx_connector_l/2])
    rotate([-90, 0, 0])
    mock_atx_connector();

    %translate([
        pcie_x_pos, 0, 1 + pcie_connector_l/2
    ])
    rotate([-90, 0, 0])
    mock_pcie_connector();

    %translate([
        0, 0.1 + atx_connector_h, atx_connector_l + 1.1 + 2
    ])
    rotate([0, 180, 0])
    mount_top();
}

module mount_top() {

    z_pos = (atx_connector_l + 1.1) - (atx_connector_l - 2) + 2;
    
    difference() {
        translate([0, 0, 8/2])
        cube([mount_w + 5, mount_l + 2, 8], center=true);

        translate([0, -2.01, 8/2 + 2])
        cube([mount_w + 0.2, mount_l + 2, 8], center=true);

        translate([-(mount_w + 0.2)/2, -1.01, z_pos])
        _side_notch(mount_l);

        translate([
            (mount_w + 0.2)/2, -1.01, z_pos
        ])
        _side_notch(mount_l);

        translate([
            -(mount_w + 0.2)/2 + pcie_connector_w/2 + 2.2,
            -(mount_l + 2)/2, -0.01
        ])
        cube([7, 22, 6], center=true);

        translate([
            (mount_w + 0.2)/2 - atx_connector_w/2 - 2.2,
            -(mount_l + 2)/2, -0.01
        ])
        cube([9, 22, 6], center=true);
    }
}

module mount_top_small() {

    z_pos = (pcie_connector_l + 1.1) - (pcie_connector_l - 2) + 2;
    
    difference() {
        translate([0, 0, 8/2])
        cube([mount_s_w + 5, mount_s_l + 2, 8], center=true);

        translate([0, -2.01, 8/2 + 2])
        cube([mount_s_w + 0.2, mount_s_l + 2, 8], center=true);

        translate([-(mount_s_w + 0.2)/2, -1.01, z_pos])
        _side_notch(mount_s_l);

        translate([
            (mount_s_w + 0.2)/2, -1.01, z_pos
        ])
        _side_notch(mount_s_l);

        translate([
            0,
            -(mount_s_l + 2)/2, -0.01
        ])
        cube([7, 22, 6], center=true);
    }
}


module _connector_pcb_mount() {
    
    module mount_texts() {
        translate([8, 12.8, 1.8 - 0.59])
        linear_extrude(0.6)
        text("5V", size=7, font="Arial:style=Bold");

        translate([4, - 19.7, 1.8 - 0.59])
        linear_extrude(0.6)
        text("12V", size=7, font="Arial:style=Bold");
        
        translate([-27, -1.5, 1.8 - 0.59])
        rotate([0, 0, -90])
        linear_extrude(0.6)
        text("5VSB", size=4, font="Arial:style=Bold");

        translate([-21, -1.5, 1.8 - 0.59])
        rotate([0, 0, -90])
        linear_extrude(0.6)
        text("PS_ON", size=4, font="Arial:style=Bold");

        translate([-16, -1.5, 1.8 - 0.59])
        rotate([0, 0, -90])
        linear_extrude(0.6)
        text("GND", size=4, font="Arial:style=Bold");
    }
    
    difference(){
        translate([0, -7/2, 1.8/2])
        cube([mount_w + 4, 49, 1.8], center=true);

        translate([0, 0, -1.8 - 0.01])
        mock_connector_pcb();

        mount_texts();
    }
}

module _connector_pcb_mount_small() {
    
    module mount_texts() {
        translate([-8, -26, 3 - 0.59])
        linear_extrude(0.6)
        text("12V", size=7, font="Arial:style=Bold");
    }
    
    difference() {
        union() {
            translate([0, 80/2 + 1, 1.8/2])
            cube([mount_s_w + 9, 80, 1.8], center=true);

            translate([0, 80/2 + 1, 3/2])
            cube([mount_s_w + 5, 80, 3], center=true);
        }

        translate([0, 56.5, -1.8 - 0.01])
        mock_connector_pcb_small();

        translate([0, 52, 0])
        mount_texts();
    }
}

module mount_small() {

    spacing_p = pin_spacing(
        pcie_connector_pins_w, pin_d, pcie_connector_pins
    );

    pcie_x_pos = 0;

    pcie_pins_x_pos = 
        pcie_x_pos - pcie_connector_pins_w/2 + pin_d/2;

    difference() {
        union() {
            translate([
                0, mount_s_l/2 + 1,  (atx_connector_l + 1.1)/2
            ])
            cube([
                mount_s_w, mount_l, pcie_connector_l + 1.1
            ], center=true);

            translate([
                -mount_s_w/2, mount_s_l/2 + 1,
                pcie_connector_l - 2
            ])
            _side_notch(mount_s_l);

            translate([
                mount_s_w/2, mount_s_l/2 + 1,
                pcie_connector_l - 2
            ])
            _side_notch(mount_s_l);

            _connector_pcb_mount_small();
        }

        translate([
            pcie_x_pos,
            (pcie_connector_h + 0.2)/2 - 0.01,
            (pcie_connector_l + 2)/2 + 1
        ])
        cube([
            pcie_connector_w + 0.2,
            pcie_connector_h + 0.2, pcie_connector_l + 2
        ], center=true);

        for (i = [0:(pcie_connector_pins/2) - 1]) {
            translate([
                pcie_pins_x_pos + i*spacing_p,
                pcie_connector_h + 0.9, 0
            ])
            _pin_hole();
        }
    }

    %translate([
        0, 0, 1 + pcie_connector_l/2
    ])
    rotate([-90, 0, 0])
    mock_pcie_connector();

    %translate([
        0, 0.1 + pcie_connector_h, pcie_connector_l + 1.1 + 2
    ])
    rotate([0, 180, 0])
    mount_top_small();
}
